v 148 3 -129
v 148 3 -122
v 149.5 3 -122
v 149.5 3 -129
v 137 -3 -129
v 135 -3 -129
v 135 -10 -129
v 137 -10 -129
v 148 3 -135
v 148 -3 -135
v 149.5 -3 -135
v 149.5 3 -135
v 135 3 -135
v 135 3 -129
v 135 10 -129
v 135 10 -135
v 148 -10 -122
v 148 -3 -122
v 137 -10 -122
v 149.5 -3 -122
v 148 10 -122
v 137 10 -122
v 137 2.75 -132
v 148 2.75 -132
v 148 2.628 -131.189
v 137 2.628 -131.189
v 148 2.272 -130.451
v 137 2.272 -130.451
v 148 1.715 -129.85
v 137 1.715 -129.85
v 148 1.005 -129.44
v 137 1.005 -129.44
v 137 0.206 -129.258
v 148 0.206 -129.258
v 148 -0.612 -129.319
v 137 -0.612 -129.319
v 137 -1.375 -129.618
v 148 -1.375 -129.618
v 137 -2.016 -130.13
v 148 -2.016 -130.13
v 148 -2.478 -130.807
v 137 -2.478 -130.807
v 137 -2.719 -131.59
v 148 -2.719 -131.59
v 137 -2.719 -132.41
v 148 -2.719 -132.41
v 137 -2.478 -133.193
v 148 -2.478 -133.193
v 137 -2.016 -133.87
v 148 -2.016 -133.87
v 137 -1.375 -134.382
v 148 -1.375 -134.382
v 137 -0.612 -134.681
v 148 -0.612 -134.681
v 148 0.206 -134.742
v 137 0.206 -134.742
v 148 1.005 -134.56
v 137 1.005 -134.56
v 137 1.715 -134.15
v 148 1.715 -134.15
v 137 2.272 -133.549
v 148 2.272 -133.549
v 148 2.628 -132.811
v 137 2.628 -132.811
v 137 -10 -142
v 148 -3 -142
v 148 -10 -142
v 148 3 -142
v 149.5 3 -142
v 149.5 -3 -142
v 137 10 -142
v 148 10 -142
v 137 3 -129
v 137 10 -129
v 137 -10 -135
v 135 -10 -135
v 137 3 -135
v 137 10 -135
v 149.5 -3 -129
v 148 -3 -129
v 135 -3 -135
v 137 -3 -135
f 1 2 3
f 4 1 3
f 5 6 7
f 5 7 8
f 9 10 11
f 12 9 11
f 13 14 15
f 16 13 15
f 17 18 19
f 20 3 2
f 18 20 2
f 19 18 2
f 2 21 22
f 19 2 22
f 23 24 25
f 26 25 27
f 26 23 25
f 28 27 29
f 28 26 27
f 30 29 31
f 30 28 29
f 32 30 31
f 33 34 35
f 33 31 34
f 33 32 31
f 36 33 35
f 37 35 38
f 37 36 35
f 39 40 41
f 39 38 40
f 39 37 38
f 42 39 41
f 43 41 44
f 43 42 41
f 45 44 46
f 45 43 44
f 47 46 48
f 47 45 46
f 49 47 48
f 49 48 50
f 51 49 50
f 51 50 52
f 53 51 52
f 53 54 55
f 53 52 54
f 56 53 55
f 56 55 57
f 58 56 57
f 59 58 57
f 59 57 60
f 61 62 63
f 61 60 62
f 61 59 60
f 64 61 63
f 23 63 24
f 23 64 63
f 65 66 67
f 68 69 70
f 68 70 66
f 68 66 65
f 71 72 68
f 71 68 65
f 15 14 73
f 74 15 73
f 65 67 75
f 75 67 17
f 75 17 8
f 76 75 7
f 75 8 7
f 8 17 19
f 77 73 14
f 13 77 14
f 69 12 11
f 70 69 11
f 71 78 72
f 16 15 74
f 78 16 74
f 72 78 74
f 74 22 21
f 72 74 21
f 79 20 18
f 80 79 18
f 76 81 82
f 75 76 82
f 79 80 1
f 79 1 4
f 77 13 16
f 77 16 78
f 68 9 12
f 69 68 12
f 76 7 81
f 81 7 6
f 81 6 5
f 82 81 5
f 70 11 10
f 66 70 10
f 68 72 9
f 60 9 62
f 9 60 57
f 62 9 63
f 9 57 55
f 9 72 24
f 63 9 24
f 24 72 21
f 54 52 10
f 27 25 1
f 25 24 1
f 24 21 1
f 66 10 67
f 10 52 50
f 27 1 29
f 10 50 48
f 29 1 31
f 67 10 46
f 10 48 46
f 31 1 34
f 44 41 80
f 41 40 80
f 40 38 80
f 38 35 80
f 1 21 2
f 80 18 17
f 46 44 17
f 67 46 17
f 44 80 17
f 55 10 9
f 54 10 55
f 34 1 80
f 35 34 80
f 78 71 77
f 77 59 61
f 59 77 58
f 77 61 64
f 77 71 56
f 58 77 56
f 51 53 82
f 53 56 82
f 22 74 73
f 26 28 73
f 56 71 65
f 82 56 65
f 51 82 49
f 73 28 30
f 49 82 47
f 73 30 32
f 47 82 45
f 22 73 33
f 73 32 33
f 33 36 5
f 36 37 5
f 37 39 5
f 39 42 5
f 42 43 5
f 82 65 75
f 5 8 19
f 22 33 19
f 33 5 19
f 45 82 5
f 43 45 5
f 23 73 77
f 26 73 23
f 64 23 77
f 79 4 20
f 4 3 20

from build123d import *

# Parameters (mm, degrees)
PAD035_DEPTH         = 10
SKETCH097_W          = 2
SKETCH097_H          = 7
SKETCH097_W_2        = 1.5
SKETCH097_H_2        = 6
POCKET055_DEPTH      = 10.001
POCKET055_DEPTH_BACK = 10.001
SKETCH098_R          = 2.75
POCKET056_DEPTH      = 2.001
POCKET056_DEPTH_BACK = 12.501


with BuildPart() as part:
    # Sketch096 → Pad035 (new body, symmetric)
    with BuildSketch(Plane.XY):
        Polygon((-2, 10), (11, 10), (11, 3), (12.5, 3), (12.5, -3), (11, -3), (11, -10), (-2, -10), (-2, -3), (0, -3), (0, 3), (-2, 3), align=None)
    extrude(amount=PAD035_DEPTH, both=True)

    # Sketch097 → Pocket055 (cut, two sides)
    with BuildSketch(Plane.XZ) as pocket055_sk:
        with Locations((-1, -6.5)):
            Rectangle(SKETCH097_W, SKETCH097_H)
        with Locations((-1, 6.5)):
            Rectangle(SKETCH097_W, SKETCH097_H)
        with Locations((11.75, 0)):
            Rectangle(SKETCH097_W_2, SKETCH097_H_2)
    extrude(amount=-POCKET055_DEPTH, mode=Mode.SUBTRACT)
    extrude(pocket055_sk.sketch, amount=POCKET055_DEPTH_BACK, mode=Mode.SUBTRACT)

    # Sketch098 → Pocket056 (cut, two sides)
    with BuildSketch(Plane.YZ) as pocket056_sk:
        Circle(SKETCH098_R)
    extrude(amount=-POCKET056_DEPTH, mode=Mode.SUBTRACT)
    extrude(pocket056_sk.sketch, amount=POCKET056_DEPTH_BACK, mode=Mode.SUBTRACT)


with BuildPart() as part_1:
    # Body022016 placement: moved
    add(part.part.moved(Location((137, 0, -132))))


solid = part_1.part
